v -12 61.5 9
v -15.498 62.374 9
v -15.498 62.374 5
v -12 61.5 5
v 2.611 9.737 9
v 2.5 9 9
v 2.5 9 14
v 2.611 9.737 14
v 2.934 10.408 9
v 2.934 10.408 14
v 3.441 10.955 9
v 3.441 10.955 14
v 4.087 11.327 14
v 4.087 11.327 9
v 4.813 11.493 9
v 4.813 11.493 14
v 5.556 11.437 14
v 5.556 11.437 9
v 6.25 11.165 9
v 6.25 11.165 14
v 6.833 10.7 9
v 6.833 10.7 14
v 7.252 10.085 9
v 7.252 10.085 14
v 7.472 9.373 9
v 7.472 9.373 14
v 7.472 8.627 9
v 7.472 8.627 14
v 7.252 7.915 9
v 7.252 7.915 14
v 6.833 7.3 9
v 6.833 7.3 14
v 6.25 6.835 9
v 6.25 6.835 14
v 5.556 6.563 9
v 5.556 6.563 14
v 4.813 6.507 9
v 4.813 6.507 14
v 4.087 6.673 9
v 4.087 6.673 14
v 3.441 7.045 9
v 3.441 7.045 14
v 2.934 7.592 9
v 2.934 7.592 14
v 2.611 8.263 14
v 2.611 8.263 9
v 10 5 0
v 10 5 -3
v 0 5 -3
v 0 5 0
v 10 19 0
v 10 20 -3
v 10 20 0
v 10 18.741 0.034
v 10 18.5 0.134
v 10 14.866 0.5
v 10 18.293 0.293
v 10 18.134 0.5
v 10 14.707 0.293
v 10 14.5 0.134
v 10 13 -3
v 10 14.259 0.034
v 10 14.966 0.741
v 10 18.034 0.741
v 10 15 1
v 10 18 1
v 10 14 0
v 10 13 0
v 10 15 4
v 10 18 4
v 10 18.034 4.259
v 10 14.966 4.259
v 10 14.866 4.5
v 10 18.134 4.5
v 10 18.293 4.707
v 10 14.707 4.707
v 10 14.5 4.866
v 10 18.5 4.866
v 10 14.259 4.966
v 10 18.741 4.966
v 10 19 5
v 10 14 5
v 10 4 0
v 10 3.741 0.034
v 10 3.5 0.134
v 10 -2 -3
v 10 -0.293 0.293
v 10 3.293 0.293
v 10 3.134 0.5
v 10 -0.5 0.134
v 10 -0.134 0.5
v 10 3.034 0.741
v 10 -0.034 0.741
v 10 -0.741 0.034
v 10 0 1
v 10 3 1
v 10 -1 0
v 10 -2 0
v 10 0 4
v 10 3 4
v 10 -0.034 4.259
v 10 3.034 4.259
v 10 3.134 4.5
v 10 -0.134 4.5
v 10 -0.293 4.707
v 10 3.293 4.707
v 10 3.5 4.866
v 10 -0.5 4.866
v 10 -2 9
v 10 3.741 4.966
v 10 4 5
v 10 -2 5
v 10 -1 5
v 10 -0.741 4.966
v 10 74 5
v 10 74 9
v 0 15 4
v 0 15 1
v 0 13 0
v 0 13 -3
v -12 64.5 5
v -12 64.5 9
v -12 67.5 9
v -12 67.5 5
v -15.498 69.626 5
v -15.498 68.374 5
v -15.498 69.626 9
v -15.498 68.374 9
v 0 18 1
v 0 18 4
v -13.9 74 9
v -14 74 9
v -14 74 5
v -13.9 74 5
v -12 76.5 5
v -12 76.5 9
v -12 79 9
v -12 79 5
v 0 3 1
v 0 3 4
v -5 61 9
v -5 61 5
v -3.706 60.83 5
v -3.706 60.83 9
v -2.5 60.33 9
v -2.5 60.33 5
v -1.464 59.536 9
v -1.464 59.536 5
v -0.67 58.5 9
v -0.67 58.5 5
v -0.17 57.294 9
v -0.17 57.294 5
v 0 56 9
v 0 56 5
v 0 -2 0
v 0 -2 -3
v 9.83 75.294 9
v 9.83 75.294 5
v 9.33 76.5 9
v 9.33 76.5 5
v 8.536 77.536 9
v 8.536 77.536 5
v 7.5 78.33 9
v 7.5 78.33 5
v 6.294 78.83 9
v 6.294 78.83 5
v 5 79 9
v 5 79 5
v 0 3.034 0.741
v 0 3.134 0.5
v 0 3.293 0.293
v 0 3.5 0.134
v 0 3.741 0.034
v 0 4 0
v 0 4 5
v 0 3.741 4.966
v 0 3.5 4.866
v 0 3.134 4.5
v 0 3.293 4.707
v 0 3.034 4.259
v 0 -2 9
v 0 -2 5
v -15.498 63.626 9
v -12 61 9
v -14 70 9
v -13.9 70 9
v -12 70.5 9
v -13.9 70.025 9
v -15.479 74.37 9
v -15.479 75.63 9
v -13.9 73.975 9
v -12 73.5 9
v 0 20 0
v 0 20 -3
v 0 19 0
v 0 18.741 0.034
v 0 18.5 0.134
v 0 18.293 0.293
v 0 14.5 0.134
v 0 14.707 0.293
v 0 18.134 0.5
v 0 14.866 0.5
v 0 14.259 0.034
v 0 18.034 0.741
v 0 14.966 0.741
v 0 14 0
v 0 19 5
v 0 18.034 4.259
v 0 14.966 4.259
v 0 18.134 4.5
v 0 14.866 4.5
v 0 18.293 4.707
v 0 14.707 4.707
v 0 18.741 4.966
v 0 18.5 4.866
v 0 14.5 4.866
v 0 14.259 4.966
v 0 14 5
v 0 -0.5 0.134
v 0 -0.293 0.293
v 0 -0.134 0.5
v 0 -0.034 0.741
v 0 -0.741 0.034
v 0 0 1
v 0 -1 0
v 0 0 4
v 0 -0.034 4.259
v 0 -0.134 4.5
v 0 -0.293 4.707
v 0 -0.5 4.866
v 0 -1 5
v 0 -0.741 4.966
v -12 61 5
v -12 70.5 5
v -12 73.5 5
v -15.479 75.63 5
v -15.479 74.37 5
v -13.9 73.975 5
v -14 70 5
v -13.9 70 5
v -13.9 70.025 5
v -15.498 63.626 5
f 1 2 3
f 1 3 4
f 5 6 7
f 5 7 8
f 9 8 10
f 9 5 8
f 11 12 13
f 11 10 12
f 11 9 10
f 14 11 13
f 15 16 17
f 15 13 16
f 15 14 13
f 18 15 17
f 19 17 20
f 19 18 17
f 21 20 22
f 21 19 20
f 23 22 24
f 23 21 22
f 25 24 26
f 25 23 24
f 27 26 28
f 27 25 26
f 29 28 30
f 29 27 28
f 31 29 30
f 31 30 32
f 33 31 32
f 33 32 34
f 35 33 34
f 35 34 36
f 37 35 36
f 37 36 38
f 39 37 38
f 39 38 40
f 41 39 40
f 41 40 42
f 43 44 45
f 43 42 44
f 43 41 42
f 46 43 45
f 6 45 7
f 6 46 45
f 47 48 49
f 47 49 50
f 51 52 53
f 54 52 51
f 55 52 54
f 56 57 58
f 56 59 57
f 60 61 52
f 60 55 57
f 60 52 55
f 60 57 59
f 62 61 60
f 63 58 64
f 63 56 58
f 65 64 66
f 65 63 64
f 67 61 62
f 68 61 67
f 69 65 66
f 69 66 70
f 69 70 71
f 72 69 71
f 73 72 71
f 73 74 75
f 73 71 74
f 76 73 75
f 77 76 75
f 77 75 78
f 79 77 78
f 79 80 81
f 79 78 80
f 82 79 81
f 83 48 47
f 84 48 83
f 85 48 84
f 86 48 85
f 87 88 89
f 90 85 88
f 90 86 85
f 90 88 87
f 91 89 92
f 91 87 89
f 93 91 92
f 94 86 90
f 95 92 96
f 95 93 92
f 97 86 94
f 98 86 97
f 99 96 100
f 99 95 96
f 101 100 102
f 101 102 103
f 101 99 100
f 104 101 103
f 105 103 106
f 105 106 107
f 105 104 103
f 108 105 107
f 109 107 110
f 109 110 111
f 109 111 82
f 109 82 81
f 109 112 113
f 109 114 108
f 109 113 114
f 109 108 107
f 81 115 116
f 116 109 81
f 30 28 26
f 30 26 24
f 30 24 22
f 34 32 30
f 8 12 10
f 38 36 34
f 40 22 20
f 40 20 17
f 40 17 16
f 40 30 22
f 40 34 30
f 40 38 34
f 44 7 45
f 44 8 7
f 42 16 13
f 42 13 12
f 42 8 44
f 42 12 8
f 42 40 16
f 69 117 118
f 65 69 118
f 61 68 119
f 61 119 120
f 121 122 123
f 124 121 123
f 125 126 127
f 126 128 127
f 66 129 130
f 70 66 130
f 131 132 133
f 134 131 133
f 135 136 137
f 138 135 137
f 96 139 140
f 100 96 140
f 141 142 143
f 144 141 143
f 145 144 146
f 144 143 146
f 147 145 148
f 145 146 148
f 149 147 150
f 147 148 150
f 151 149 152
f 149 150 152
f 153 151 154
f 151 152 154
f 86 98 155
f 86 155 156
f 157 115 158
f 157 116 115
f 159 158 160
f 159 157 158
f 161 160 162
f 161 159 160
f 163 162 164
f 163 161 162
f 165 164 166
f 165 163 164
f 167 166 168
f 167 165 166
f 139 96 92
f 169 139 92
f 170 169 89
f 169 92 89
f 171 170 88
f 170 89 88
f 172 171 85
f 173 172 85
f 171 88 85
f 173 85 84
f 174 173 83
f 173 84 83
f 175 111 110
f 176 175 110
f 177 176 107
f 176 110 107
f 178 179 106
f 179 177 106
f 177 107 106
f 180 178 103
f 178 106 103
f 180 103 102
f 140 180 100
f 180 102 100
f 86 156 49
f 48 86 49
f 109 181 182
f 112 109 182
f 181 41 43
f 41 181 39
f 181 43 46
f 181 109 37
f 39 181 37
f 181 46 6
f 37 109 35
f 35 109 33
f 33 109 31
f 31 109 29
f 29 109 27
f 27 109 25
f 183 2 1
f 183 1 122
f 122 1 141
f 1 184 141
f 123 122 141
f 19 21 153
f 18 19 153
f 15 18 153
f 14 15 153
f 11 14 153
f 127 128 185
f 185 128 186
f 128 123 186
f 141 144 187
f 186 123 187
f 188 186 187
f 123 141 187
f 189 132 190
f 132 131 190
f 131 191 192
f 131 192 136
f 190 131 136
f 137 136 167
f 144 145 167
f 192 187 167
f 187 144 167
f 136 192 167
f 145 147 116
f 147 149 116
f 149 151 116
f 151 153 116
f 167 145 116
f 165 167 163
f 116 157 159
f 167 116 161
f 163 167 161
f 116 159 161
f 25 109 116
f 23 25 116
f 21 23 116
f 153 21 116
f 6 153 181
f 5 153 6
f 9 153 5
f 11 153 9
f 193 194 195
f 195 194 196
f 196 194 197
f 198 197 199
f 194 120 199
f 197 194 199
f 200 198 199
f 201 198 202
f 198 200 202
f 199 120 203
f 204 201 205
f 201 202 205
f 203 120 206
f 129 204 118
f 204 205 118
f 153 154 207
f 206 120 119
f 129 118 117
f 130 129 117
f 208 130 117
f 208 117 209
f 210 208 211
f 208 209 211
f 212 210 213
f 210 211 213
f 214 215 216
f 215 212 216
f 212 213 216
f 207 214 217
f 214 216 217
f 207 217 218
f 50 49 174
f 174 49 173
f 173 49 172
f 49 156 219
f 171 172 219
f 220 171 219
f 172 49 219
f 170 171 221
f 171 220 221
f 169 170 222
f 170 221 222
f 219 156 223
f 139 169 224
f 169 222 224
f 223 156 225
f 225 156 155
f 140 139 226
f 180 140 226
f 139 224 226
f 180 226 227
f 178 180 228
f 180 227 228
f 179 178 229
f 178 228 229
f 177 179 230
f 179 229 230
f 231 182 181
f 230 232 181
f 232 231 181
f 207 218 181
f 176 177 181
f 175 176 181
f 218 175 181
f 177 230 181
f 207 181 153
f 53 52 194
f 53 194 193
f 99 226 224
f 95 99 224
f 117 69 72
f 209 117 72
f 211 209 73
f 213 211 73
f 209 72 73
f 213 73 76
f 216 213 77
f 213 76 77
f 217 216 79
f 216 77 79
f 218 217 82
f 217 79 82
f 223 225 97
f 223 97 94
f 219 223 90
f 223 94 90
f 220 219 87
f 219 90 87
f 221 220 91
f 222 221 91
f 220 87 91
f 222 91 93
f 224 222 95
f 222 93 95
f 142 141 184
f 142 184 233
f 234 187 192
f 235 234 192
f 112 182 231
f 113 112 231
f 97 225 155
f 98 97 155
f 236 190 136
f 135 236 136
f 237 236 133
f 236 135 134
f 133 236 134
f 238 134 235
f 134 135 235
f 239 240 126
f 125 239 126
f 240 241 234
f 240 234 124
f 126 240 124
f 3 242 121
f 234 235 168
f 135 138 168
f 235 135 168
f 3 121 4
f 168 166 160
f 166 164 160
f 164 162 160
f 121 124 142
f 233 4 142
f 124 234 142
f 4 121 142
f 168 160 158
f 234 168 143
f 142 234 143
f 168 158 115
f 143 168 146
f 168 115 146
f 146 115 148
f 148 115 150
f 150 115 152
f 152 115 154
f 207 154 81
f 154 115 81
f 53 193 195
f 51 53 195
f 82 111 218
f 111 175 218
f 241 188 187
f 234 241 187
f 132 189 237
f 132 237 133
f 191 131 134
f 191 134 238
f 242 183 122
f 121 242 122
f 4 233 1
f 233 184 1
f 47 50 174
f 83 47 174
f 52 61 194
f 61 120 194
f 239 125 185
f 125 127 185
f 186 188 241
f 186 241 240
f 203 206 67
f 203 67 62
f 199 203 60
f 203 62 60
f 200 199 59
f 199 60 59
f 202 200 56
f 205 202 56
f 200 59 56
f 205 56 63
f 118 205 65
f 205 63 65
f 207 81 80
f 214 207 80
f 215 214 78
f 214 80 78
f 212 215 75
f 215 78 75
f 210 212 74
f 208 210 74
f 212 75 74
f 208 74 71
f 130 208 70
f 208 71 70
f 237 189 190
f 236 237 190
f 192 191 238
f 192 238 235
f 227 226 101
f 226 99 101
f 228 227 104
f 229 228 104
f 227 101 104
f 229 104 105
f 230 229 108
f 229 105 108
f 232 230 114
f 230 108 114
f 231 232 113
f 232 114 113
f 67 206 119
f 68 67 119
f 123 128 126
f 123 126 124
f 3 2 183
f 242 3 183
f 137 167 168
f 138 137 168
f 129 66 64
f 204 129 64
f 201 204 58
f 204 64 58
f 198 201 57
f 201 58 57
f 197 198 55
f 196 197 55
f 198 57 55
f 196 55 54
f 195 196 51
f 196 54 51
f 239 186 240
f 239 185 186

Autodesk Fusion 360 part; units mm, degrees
sketch "Sketch1" plane through (0, 0, 0) normal (1, 0, 0) x (0, 1, 0)
  line L0 (0, 0) -> (0, 5) construction
  line L1 (0, 5) -> (3, 5) construction
  line L2 (3, 5) -> (3, 0) construction
  line L3 (3, 0) -> (0, 0) construction
  line L4 (0, 5) -> (-2, 5) construction
  line L5 (-2, 5) -> (-2, 9) construction
  line L6 (0, 0) -> (-2, 0) construction
  line L7 (-2, 0) -> (-2, -3) construction
  line L8 (-2, -3) -> (5, -3) construction
  line L9 (5, -3) -> (5, 0) construction
  line L10 (5, 0) -> (3, 0) construction
  line L11 (3, 5) -> (5, 5) construction
  line L12 (5, 5) -> (5, 9) construction
  line L13 (-2, 9) -> (5, 9) construction
  line L14 (-2, 5) -> (0, 5)
  line L15 (0, 5) -> (0, 0)
  line L16 (0, 0) -> (-2, 0)
  line L17 (-2, 0) -> (-2, -3)
  line L18 (-2, -3) -> (5, -3)
  line L19 (5, -3) -> (5, 0)
  line L20 (5, 0) -> (3, 0)
  line L21 (3, 0) -> (3, 5)
  line L22 (3, 5) -> (5, 5)
  line L23 (5, 5) -> (5, 9)
  line L24 (5, 9) -> (-2, 9)
  line L25 (-2, 9) -> (-2, 5)
  line L26 (-2, 5) -> (0, 5)
  line L27 (5, 9) -> (-2, 9)
  line L28 (-2, 0) -> (-2, -3)
  line L29 (3, 5) -> (5, 5) construction
  line L30 (5, 5) -> (5, 9) construction
  line L31 (5, 0) -> (3, 0)
  line L32 (-2, 0) -> (-2, -3) construction
  line L33 (5, 0) -> (3, 0) construction
  line L34 (-2, 9) -> (5, 9) construction
  line L35 (-2, -3) -> (5, -3) construction
  line L36 (-2, -3) -> (5, -3)
  line L37 (-2, 9) -> (-2, 5)
  line L38 (5, -3) -> (5, 0) construction
  line L39 (3, 5) -> (3, 0) construction
  line L40 (5, -3) -> (5, 0)
  line L41 (0, 0) -> (-2, 0)
  line L42 (3, 0) -> (3, 5)
  line L43 (0, 0) -> (-2, 0) construction
  line L44 (-2, 5) -> (-2, 9) construction
  line L45 (0, 5) -> (3, 5) construction
  line L46 (3, 5) -> (5, 5)
  line L47 (5, 5) -> (5, 9)
  line L48 (0, 0) -> (0, 5) construction
  line L49 (3, 0) -> (0, 0) construction
  line L50 (0, 5) -> (-2, 5) construction
  line L51 (0, 5) -> (0, 0)
  line L52 (13, 5) -> (15, 5)
  line L53 (20, 9) -> (13, 9)
  line L54 (13, 0) -> (13, -3)
  line L55 (18, 5) -> (20, 5) construction
  line L56 (20, 5) -> (20, 9) construction
  line L57 (20, 0) -> (18, 0)
  line L58 (13, 0) -> (13, -3) construction
  line L59 (20, 0) -> (18, 0) construction
  line L60 (13, 9) -> (20, 9) construction
  line L61 (13, -3) -> (20, -3) construction
  line L62 (13, -3) -> (20, -3)
  line L63 (13, 9) -> (13, 5)
  line L64 (20, -3) -> (20, 0) construction
  line L65 (18, 5) -> (18, 0) construction
  line L66 (20, -3) -> (20, 0)
  line L67 (15, 0) -> (13, 0)
  line L68 (18, 0) -> (18, 5)
  line L69 (15, 0) -> (13, 0) construction
  line L70 (13, 5) -> (13, 9) construction
  line L71 (15, 5) -> (18, 5) construction
  line L72 (18, 5) -> (20, 5)
  line L73 (20, 5) -> (20, 9)
  line L74 (15, 0) -> (15, 5) construction
  line L75 (18, 0) -> (15, 0) construction
  line L76 (15, 5) -> (13, 5) construction
  line L77 (15, 5) -> (15, 0)
  point P0 (15, 0)
  dimension "d1" = 5
  dimension "d2" = 3
  dimension "d3" = 2
  dimension "d4" = 4
  dimension "d5" = 3
  dimension "d6" = 2
  dimension "d7" = 4
  dimension "d8" = 5
  dimension "d9" = 3
  dimension "d10" = 2
  dimension "d11" = 4
  dimension "d12" = 3
  dimension "d13" = 2
  dimension "d14" = 4
  dimension "d15" = 5
  dimension "d16" = 3
  dimension "d17" = 2
  dimension "d18" = 4
  dimension "d19" = 3
  dimension "d20" = 2
  dimension "d21" = 4
extrude "Extrude1" add sketch "Sketch1" along normal blind 10 makes body 1 at (6.6667, 0.3333, -3) makes body 2 at (3.3333, 15.3333, -3)
extrude "Extrude2" add 1 faces at (3.3333, 5, 6.3333) along direction (0, 1, 0) blind 8 on bodies 1 bodies 1 2
fillet "Fillet1" radius 1 1 edges at (5, 18, 5) on bodies 1
fillet "Fillet2" radius 1 1 edges at (5, 18, 0) on bodies 1
fillet "Fillet3" radius 1 1 edges at (5, 15, 0) on bodies 1
fillet "Fillet4" radius 1 1 edges at (5, 15, 5) on bodies 1
fillet "Fillet5" radius 1 1 edges at (5, 3, 0) on bodies 1
fillet "Fillet6" radius 1 1 edges at (5, 0, 0) on bodies 1
fillet "Fillet7" radius 1 1 edges at (5, 0, 5) on bodies 1
fillet "Fillet8" radius 1 1 edges at (5, 3, 5) on bodies 1
extrude "Extrude3" add 1 faces at (3.3333, 20, 6.3333) along direction (0, 1, 0) blind 59 on bodies 1 bodies 1
sketch "Sketch2" plane through (0, 0, 9) normal (0, 0, 1) x (-1, 0, 0)
  line L0 (0, -5) -> (-10, -5)
  line L1 (-10, -5) -> (-10, -13)
  line L2 (-10, -13) -> (0, -13)
  line L3 (0, -13) -> (0, -5)
  line L4 (-5, -13) -> (-5, -9) construction
  circle A0 centre (-5, -9) radius 2.5
  dimension "d44" = 5
extrude "Extrude4" add sketch "Sketch2" along normal blind 5 contours A0 bodies 1
sketch "Sketch3" plane through (0, 0, 0) normal (-1, 0, 0) x (0, -1, 0)
  arc A0 (1, 5) -> (0, 4) centre (1, 4) ccw
  line L0 (1, 5) -> (2, 5)
  line L1 (2, 5) -> (2, 9)
  line L2 (2, 9) -> (-5, 9)
  line L3 (-5, 9) -> (-13, 9)
  line L4 (-13, 9) -> (-20, 9)
  line L5 (-20, 9) -> (-79, 9)
  line L6 (-79, 9) -> (-79, 5)
  line L7 (-79, 5) -> (-19, 5)
  arc A1 (-18, 4) -> (-19, 5) centre (-19, 4) ccw
  line L8 (-18, 4) -> (-18, 1)
  arc A2 (-19, 0) -> (-18, 1) centre (-19, 1) ccw
  line L9 (-19, 0) -> (-20, 0)
  line L10 (-20, 0) -> (-20, -3)
  line L11 (-20, -3) -> (-13, -3)
  line L12 (-13, -3) -> (-13, 0)
  line L13 (-13, 0) -> (-14, 0)
  arc A3 (-15, 1) -> (-14, 0) centre (-14, 1) ccw
  line L14 (-15, 1) -> (-15, 4)
  arc A4 (-14, 5) -> (-15, 4) centre (-14, 4) ccw
  line L15 (-14, 5) -> (-4, 5)
  arc A5 (-3, 4) -> (-4, 5) centre (-4, 4) ccw
  line L16 (-3, 4) -> (-3, 1)
  arc A6 (-4, 0) -> (-3, 1) centre (-4, 1) ccw
  line L17 (-4, 0) -> (-5, 0)
  line L18 (-5, 0) -> (-5, -3)
  line L19 (-5, -3) -> (2, -3)
  line L20 (2, -3) -> (2, 0)
  line L21 (2, 0) -> (1, 0)
  arc A7 (0, 1) -> (1, 0) centre (1, 1) ccw
  line L22 (0, 1) -> (0, 4)
  line L23 (-79, 9) -> (-61, 9)
  line L24 (-61, 9) -> (-61, 5)
  line L25 (-61, 5) -> (-79, 5)
  line L26 (-79, 5) -> (-79, 9)
  dimension "d47" = 18
extrude "Extrude5" add sketch "Sketch3" along normal blind 14 contours L5 L6 L7 L23 L24 L25 L26 bodies 1
fillet "Fillet9" radius 5 1 edges at (0, 61, 7) on bodies 1
fillet "Fillet10" radius 5 1 edges at (10, 79, 7) on bodies 1
sketch "Sketch4" plane through (0, 0, 9) normal (0, 0, 1) x (-1, 0, 0)
  arc A0 (-10, -74) -> (-5, -79) centre (-5, -74) ccw
  line L0 (-5, -79) -> (14, -79)
  line L1 (14, -79) -> (14, -61)
  line L2 (14, -61) -> (5, -61)
  arc A1 (0, -56) -> (5, -61) centre (5, -56) ccw
  line L3 (0, -56) -> (0, -20)
  line L4 (0, -20) -> (-10, -20)
  line L5 (-10, -20) -> (-10, -74)
  line L6 (16, -79) -> (12, -79) construction
  line L7 (12, -79) -> (12, -61) construction
  line L8 (12, -61) -> (16, -61) construction
  line L9 (16, -61) -> (16, -79) construction
  line L10 (12, -79) -> (12, -77) construction
  line L11 (12, -77) -> (16, -76) construction
  line L12 (16, -76) -> (16, -74) construction
  line L13 (16, -74) -> (12, -73) construction
  line L14 (12, -71) -> (16, -70) construction
  line L15 (16, -70) -> (16, -68) construction
  line L16 (16, -68) -> (12, -67) construction
  line L17 (12, -65) -> (16, -64) construction
  line L18 (16, -62) -> (12, -61) construction
  line L19 (12, -76.5) -> (16, -75.5) construction
  line L20 (16, -74.5) -> (12, -73.5) construction
  line L21 (16, -68.5) -> (12, -67.5) construction
  line L22 (16, -69.5) -> (12, -70.5) construction
  line L23 (16, -62.5) -> (12, -61.5) construction
  line L24 (16, -63.5) -> (12, -64.5) construction
  line L25 (15.4977, -62.3744) -> (15.4977, -63.6256)
  line L26 (15.4977, -68.3744) -> (15.4977, -69.6256)
  line L27 (15.4787, -74.3697) -> (15.4787, -75.6303)
  line L28 (15.4787, -75.6303) -> (12, -76.5)
  line L29 (15.4787, -74.3697) -> (12, -73.5)
  line L30 (15.4977, -69.6256) -> (12, -70.5)
  line L31 (15.4977, -68.3744) -> (12, -67.5)
  line L32 (15.4977, -63.6256) -> (12, -64.5)
  line L33 (15.4977, -62.3744) -> (12, -61.5)
  line L34 (13.925, -70.0187) -> (14, -74)
  line L35 (14, -76) -> (14, -79)
  line L36 (14, -62) -> (14, -61)
  line L37 (12, -61) -> (12, -61.5)
  line L38 (12, -64.5) -> (12, -67.5)
  line L39 (14, -64) -> (14, -68)
  line L40 (12, -70.5) -> (12, -73.5)
  line L41 (12, -76.5) -> (12, -79)
  line L42 (14, -79) -> (12, -79)
extrude "Extrude6" add sketch "Sketch4" against normal blind 4 contours L1 L27 L28 L29 | L1 L26 L30 L31 | L1 L25 L32 L33 bodies 1
extrude "Extrude7" cut sketch "Sketch4" against normal blind 4 contours L0 L1 L28 L35 L41 L42 | L29 L30 L34 L40 | L1 L2 L33 L36 L37 | L1 L31 L32 L38 L39 bodies 1
extrude "Extrude8" cut 1 faces at (-14, 72.6667, 7.6667) along direction (1, 0, 0) blind 0.1 on bodies 1 bodies 1
